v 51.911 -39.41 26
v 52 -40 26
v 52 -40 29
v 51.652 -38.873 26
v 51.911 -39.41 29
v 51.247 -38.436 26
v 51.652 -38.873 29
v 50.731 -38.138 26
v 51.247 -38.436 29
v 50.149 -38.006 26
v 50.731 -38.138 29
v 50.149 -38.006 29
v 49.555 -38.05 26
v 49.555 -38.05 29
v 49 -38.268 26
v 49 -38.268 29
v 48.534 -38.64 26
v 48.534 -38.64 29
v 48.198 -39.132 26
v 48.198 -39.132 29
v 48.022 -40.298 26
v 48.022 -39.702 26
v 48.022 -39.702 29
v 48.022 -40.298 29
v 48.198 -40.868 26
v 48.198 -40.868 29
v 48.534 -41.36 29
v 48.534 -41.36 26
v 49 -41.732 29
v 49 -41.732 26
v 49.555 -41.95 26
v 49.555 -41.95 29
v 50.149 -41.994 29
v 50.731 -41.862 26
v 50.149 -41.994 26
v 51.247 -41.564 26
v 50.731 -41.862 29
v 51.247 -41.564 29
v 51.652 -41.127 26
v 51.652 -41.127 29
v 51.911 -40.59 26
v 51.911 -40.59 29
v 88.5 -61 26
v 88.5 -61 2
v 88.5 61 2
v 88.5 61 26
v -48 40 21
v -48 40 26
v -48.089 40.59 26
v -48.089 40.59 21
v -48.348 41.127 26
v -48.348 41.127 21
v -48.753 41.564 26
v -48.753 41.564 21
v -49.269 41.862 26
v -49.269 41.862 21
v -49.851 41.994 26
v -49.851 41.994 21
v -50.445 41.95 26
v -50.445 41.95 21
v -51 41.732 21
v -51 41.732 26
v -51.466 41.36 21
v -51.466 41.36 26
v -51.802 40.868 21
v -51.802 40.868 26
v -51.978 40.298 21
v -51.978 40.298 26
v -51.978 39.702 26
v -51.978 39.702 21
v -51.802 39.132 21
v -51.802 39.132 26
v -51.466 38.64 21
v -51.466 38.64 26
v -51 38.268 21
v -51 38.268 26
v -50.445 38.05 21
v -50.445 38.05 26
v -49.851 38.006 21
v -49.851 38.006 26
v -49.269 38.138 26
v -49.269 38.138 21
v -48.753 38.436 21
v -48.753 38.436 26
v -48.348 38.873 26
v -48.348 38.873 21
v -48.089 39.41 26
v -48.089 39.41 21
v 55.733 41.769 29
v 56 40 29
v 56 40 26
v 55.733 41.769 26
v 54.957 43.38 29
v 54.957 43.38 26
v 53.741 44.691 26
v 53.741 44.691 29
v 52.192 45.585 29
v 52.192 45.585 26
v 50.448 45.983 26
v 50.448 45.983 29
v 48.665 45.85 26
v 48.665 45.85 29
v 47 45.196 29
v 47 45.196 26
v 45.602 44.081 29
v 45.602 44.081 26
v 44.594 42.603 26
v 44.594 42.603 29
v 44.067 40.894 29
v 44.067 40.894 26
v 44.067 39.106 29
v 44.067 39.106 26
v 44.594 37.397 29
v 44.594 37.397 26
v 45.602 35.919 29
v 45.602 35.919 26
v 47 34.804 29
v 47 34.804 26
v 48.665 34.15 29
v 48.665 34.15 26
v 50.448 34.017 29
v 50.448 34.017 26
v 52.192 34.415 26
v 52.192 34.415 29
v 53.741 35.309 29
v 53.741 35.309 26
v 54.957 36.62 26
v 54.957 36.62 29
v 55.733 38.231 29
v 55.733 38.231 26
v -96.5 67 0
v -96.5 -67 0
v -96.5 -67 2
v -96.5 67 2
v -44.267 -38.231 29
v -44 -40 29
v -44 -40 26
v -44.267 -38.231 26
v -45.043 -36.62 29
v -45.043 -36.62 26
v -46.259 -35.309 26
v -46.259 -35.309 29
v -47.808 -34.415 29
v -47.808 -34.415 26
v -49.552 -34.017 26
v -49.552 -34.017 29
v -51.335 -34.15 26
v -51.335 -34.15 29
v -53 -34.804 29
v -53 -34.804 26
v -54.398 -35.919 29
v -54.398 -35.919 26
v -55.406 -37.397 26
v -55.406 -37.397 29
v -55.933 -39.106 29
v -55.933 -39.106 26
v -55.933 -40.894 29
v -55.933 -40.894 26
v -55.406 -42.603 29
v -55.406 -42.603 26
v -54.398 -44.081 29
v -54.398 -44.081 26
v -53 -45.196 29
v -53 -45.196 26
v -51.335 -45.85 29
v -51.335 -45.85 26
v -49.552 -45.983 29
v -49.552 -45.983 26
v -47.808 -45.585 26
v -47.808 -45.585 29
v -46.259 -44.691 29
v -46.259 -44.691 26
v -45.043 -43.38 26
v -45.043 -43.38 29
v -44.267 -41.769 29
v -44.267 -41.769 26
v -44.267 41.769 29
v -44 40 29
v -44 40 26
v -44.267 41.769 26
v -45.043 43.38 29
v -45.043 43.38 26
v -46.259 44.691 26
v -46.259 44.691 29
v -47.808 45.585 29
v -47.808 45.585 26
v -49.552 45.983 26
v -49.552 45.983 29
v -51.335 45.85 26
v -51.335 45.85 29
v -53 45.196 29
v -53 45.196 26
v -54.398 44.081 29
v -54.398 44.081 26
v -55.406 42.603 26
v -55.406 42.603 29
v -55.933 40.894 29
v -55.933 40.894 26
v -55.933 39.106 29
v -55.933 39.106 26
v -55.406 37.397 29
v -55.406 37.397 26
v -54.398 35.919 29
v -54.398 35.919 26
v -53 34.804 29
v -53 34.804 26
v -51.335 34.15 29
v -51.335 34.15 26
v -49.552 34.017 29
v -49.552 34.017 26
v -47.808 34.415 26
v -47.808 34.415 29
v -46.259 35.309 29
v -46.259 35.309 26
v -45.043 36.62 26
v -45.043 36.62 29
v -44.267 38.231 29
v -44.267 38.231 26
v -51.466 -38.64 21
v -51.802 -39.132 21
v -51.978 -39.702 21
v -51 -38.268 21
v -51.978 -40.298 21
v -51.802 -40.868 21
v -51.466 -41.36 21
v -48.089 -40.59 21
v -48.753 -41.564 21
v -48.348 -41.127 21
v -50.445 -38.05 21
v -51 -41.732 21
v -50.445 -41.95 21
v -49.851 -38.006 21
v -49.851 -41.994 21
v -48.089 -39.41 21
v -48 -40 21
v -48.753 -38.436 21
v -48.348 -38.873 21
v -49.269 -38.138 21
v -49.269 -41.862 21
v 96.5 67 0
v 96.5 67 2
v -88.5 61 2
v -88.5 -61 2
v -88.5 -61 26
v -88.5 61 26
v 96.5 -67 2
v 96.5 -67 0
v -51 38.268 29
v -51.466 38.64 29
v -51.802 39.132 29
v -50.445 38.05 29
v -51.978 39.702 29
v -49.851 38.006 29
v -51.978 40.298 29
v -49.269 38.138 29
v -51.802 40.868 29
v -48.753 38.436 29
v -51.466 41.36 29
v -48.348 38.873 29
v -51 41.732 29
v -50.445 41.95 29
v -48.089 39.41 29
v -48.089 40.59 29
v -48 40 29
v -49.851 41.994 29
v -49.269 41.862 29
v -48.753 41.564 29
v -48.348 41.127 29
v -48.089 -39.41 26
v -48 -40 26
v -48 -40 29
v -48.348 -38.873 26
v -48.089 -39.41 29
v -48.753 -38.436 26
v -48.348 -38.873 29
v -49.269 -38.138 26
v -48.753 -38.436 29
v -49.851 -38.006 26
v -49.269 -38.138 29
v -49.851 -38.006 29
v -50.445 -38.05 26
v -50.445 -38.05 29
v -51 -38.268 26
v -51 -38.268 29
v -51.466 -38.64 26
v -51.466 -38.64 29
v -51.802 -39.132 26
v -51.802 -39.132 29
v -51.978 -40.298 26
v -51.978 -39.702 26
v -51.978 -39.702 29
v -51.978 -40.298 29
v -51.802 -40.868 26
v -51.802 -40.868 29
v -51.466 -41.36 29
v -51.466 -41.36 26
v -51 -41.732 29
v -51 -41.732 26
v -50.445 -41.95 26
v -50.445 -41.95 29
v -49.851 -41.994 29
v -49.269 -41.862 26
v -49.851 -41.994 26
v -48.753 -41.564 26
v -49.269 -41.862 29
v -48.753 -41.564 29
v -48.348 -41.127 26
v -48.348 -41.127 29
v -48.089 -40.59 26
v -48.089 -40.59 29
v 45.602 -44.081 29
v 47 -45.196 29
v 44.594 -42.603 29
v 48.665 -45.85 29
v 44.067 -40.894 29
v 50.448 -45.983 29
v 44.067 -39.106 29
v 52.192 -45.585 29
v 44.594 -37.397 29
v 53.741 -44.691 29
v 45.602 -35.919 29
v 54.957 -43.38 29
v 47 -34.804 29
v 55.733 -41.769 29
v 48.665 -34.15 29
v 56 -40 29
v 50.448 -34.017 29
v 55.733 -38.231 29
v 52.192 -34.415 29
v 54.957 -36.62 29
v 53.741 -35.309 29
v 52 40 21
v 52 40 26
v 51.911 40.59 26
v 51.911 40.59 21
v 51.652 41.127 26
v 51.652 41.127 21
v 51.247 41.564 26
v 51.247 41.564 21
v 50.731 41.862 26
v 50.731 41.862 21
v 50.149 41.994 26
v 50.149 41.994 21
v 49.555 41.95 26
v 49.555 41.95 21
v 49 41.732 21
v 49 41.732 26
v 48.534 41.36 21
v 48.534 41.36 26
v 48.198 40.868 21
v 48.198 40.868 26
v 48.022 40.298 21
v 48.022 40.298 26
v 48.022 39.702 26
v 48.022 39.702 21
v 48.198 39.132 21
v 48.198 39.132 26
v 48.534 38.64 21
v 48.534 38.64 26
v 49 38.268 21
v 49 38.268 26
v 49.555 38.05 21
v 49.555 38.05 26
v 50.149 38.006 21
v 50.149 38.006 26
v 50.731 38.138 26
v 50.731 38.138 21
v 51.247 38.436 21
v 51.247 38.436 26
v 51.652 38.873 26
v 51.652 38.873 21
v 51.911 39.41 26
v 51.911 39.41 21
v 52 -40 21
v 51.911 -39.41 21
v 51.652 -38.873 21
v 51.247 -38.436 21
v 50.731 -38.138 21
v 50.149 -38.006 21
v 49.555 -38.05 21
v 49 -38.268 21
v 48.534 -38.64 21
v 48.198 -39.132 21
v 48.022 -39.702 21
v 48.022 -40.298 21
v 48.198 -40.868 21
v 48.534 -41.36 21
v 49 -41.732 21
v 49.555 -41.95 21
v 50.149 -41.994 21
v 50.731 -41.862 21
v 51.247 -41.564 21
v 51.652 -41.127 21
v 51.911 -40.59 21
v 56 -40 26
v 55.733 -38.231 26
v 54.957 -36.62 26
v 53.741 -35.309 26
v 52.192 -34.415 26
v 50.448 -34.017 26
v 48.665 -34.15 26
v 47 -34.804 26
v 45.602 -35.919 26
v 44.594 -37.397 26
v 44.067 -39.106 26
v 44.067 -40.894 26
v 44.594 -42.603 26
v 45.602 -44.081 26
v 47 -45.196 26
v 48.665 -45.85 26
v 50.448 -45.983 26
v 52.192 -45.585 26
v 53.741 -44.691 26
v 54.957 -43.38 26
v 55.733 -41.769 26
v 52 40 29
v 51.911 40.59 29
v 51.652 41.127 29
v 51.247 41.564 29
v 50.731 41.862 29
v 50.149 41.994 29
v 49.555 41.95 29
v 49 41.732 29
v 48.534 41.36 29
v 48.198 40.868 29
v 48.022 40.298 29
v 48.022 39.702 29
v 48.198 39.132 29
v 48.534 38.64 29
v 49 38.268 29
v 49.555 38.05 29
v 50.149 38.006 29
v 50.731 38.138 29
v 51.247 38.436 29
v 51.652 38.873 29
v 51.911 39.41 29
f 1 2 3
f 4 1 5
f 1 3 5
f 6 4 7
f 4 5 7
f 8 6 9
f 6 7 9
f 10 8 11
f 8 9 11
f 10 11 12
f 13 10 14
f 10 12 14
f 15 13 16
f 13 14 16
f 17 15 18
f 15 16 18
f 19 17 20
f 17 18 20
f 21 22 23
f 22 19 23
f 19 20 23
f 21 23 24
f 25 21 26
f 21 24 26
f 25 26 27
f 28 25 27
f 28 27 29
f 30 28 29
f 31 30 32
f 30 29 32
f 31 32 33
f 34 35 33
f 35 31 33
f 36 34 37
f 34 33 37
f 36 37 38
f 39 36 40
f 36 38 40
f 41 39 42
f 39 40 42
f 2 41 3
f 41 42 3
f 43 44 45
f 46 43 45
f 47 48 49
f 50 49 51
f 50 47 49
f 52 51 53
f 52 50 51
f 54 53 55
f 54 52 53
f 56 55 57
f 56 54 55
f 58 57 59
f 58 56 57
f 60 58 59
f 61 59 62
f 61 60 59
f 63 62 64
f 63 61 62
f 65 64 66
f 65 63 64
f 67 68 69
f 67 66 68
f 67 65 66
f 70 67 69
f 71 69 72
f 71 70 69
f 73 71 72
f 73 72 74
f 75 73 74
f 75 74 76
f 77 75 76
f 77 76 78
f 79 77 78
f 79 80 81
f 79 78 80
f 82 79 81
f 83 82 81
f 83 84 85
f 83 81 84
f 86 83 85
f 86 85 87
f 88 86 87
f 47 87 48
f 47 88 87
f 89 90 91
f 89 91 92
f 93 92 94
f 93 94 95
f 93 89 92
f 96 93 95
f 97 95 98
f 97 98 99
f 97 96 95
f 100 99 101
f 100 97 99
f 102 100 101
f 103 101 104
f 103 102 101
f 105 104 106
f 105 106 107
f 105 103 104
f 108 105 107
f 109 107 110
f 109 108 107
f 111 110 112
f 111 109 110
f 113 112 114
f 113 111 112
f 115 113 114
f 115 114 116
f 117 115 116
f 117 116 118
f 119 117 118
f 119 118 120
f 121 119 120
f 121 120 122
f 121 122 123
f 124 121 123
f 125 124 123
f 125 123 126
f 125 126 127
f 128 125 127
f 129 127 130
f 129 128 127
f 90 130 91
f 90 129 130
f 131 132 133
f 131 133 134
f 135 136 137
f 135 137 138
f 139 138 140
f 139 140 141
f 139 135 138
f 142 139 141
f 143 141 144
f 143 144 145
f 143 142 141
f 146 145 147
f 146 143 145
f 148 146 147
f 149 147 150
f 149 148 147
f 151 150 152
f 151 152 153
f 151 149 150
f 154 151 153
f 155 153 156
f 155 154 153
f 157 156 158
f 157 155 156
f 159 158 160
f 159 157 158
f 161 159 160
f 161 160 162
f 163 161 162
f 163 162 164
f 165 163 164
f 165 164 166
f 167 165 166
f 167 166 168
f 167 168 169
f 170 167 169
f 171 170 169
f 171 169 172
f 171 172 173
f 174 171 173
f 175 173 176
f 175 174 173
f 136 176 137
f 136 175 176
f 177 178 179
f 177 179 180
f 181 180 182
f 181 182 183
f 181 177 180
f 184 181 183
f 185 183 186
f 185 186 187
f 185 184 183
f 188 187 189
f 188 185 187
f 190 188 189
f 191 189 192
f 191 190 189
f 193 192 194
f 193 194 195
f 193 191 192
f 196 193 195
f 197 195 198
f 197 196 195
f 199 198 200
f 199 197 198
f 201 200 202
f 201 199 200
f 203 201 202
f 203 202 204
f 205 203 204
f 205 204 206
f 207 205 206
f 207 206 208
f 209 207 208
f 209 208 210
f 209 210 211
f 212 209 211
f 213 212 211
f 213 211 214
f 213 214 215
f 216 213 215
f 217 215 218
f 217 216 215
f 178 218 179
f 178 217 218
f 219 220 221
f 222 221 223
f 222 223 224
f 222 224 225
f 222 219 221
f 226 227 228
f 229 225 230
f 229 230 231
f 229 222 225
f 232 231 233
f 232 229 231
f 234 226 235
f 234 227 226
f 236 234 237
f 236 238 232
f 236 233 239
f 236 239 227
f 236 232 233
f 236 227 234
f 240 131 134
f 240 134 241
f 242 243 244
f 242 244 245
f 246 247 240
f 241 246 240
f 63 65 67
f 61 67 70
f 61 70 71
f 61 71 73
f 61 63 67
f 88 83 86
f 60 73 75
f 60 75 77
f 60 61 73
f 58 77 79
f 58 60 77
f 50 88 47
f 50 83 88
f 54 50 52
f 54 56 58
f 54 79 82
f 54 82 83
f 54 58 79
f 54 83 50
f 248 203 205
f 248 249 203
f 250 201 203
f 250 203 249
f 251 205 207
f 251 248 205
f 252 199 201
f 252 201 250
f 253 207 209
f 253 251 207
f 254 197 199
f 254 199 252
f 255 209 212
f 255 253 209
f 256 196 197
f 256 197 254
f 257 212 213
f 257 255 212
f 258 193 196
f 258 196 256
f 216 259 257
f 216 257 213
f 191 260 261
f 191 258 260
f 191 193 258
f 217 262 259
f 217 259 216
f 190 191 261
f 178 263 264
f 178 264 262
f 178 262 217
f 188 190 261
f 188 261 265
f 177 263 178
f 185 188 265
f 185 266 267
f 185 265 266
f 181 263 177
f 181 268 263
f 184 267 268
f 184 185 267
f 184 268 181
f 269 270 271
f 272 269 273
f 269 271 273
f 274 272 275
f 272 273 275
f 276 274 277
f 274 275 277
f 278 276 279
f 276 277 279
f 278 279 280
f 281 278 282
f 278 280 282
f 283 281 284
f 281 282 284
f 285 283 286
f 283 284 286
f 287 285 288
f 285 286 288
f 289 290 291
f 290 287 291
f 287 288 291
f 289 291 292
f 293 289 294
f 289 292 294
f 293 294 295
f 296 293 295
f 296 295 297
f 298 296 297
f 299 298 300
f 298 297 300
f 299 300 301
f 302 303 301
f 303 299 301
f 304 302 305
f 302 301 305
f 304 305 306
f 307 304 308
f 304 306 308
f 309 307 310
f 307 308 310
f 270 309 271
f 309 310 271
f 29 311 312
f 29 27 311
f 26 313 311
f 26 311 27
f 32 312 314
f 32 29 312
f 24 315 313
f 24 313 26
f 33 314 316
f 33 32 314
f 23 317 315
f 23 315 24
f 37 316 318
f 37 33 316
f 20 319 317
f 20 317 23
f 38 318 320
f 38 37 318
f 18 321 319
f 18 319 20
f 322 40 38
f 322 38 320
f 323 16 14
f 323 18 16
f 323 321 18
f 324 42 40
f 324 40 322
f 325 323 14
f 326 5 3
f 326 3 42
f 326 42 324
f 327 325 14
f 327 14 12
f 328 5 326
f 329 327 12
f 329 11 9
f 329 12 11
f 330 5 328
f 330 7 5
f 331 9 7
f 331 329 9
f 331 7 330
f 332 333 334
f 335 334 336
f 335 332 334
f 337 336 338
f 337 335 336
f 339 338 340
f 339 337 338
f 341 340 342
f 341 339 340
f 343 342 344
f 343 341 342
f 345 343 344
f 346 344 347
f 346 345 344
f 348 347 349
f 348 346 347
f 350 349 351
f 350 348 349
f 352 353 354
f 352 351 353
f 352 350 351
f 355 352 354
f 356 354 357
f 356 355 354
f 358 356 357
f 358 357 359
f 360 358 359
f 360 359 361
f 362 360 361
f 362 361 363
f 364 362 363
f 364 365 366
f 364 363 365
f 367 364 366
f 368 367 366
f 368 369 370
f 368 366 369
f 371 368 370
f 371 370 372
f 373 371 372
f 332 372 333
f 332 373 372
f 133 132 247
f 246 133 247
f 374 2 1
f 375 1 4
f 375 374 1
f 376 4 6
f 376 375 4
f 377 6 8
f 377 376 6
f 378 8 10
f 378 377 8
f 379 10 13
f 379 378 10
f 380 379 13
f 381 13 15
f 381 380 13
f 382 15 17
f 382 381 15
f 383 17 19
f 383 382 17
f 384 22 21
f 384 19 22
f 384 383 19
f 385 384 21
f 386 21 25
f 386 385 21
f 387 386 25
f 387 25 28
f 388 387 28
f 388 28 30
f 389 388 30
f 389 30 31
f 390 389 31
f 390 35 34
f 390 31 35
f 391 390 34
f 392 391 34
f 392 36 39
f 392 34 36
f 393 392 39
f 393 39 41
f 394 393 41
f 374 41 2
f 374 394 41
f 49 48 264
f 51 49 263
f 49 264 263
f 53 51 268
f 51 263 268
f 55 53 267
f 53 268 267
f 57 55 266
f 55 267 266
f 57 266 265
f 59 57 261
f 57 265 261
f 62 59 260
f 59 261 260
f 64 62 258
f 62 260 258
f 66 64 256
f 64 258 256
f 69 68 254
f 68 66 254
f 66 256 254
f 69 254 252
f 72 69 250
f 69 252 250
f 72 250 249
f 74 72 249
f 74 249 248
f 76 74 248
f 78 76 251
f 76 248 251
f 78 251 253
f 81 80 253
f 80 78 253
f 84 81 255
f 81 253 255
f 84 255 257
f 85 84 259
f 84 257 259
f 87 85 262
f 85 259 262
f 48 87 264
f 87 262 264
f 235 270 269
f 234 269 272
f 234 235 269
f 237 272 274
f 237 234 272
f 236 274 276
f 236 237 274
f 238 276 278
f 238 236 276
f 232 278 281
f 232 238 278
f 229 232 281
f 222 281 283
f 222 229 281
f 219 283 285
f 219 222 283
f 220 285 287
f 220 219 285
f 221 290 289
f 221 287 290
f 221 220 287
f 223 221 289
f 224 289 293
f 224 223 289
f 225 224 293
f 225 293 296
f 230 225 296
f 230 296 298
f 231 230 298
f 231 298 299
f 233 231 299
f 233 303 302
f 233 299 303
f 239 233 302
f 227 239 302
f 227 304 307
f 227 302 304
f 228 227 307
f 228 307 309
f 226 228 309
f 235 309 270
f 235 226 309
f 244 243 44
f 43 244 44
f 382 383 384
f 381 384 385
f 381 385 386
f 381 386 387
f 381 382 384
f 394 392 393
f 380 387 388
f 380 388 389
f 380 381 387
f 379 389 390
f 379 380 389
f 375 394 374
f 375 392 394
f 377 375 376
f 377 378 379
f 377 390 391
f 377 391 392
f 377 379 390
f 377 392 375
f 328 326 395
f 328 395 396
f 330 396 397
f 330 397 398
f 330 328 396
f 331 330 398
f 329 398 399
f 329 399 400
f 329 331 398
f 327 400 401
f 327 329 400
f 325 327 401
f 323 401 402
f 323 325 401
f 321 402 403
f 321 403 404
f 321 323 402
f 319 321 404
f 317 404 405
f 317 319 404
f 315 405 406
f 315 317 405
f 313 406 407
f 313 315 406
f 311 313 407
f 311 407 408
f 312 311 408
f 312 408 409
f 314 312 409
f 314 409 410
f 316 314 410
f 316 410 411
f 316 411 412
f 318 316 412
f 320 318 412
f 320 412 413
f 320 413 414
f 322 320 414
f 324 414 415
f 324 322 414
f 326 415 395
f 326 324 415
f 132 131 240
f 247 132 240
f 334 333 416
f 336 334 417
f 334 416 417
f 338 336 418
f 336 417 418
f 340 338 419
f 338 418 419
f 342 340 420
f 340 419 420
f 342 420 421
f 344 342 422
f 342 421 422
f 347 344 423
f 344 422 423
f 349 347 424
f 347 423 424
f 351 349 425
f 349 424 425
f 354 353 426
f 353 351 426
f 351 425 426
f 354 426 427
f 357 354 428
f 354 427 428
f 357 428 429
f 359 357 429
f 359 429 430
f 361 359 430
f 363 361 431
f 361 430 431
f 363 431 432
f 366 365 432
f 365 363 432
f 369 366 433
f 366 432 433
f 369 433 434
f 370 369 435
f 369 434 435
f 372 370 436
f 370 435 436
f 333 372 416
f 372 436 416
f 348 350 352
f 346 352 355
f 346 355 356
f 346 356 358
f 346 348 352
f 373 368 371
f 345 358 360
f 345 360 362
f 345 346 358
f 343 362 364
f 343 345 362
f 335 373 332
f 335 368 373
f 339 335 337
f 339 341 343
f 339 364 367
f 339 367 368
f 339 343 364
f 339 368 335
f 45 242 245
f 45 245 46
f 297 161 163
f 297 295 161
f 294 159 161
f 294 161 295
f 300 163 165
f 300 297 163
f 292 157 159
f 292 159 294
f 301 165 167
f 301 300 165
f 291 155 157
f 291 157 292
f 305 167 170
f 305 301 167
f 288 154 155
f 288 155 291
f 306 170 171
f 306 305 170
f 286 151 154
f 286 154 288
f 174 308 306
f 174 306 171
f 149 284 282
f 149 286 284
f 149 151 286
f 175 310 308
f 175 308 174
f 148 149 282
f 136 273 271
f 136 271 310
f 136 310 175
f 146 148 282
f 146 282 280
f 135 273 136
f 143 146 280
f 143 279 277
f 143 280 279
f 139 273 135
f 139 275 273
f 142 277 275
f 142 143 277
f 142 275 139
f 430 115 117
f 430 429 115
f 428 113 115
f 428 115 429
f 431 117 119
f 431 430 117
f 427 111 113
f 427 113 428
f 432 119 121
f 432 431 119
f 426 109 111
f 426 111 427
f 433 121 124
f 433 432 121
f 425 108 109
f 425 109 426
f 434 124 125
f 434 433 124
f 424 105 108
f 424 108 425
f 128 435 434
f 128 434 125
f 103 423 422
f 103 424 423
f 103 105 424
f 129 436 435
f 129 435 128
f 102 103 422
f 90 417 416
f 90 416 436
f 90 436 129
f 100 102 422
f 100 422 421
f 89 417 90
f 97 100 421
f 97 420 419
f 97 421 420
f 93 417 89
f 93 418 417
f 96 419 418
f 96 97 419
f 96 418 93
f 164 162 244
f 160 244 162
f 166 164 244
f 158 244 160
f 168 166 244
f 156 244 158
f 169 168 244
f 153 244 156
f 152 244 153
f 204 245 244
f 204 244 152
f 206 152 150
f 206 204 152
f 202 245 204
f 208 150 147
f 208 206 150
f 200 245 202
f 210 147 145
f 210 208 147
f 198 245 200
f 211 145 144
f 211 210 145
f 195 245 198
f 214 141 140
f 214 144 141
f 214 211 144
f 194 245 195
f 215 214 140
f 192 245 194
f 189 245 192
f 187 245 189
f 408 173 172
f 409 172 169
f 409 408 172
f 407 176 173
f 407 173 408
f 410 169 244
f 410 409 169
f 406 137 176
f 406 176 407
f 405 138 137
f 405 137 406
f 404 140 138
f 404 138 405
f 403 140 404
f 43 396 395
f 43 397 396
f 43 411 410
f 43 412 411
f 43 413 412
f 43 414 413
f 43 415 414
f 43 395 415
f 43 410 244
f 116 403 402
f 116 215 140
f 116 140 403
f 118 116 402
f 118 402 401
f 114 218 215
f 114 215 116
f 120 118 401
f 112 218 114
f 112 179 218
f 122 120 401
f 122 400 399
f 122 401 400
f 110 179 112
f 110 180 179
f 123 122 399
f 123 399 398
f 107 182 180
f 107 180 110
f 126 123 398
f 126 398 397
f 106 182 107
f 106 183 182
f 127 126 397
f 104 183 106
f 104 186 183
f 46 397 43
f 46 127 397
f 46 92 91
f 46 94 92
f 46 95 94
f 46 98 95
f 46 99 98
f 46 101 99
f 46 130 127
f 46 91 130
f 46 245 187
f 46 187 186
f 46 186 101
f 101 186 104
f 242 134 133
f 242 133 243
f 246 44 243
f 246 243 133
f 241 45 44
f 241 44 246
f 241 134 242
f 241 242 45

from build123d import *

# Parameters (mm, degrees)
SKETCH_1_W               = 193
SKETCH_1_H               = 134
EXTRUDE_1_DEPTH          = 2
SKETCH_2_W               = 177
SKETCH_2_H               = 122
EXTRUDE_2_DEPTH          = 24
CUT_EXTRUDE_1_DEPTH      = 10
CUT_EXTRUDE_1_DEPTH_BACK = 5
SKETCH_3_R               = 2
EXTRUDE_START            = 3
SKETCH_4_R               = 6
SKETCH_4_R_2             = 2
EXTRUDE_3_DEPTH          = 3


with BuildPart() as part:
    # 草图1 → 凸台-拉伸1 (new body)
    with BuildSketch(Plane.XY):
        Rectangle(SKETCH_1_W, SKETCH_1_H)
    extrude(amount=EXTRUDE_1_DEPTH)

    # 草图2 → 凸台-拉伸2 (add)
    with BuildSketch(Plane.XY.offset(2)):
        Rectangle(SKETCH_2_W, SKETCH_2_H)
    extrude(amount=EXTRUDE_2_DEPTH)

    # 草图3 → 切除-拉伸1 (cut, two sides: drawn at the far end of the back side and taken through both)
    with BuildSketch(Plane.XY.offset(26).offset(-CUT_EXTRUDE_1_DEPTH_BACK)):
        with Locations((-50, 40)):
            Circle(SKETCH_3_R)
        with Locations((-50, -40)):
            Circle(SKETCH_3_R)
        with Locations((50, -40)):
            Circle(SKETCH_3_R)
        with Locations((50, 40)):
            Circle(SKETCH_3_R)
    extrude(amount=CUT_EXTRUDE_1_DEPTH + CUT_EXTRUDE_1_DEPTH_BACK, mode=Mode.SUBTRACT)

    # 草图4 → 凸台-拉伸3 (add)
    # profile 1 of 4: a face of its own
    with BuildSketch(Plane.XY.offset(26).offset(EXTRUDE_START)):
        with Locations((-50, 40)):
            Circle(SKETCH_4_R)
        with Locations((-50, 40)):
            Circle(SKETCH_4_R_2, mode=Mode.SUBTRACT)
    # profile 2 of 4: a face of its own
    with BuildSketch(Plane.XY.offset(26).offset(EXTRUDE_START)):
        with Locations((-50, -40)):
            Circle(SKETCH_4_R)
        with Locations((-50, -40)):
            Circle(SKETCH_4_R_2, mode=Mode.SUBTRACT)
    # profile 3 of 4: a face of its own
    with BuildSketch(Plane.XY.offset(26).offset(EXTRUDE_START)):
        with Locations((50, -40)):
            Circle(SKETCH_4_R)
        with Locations((50, -40)):
            Circle(SKETCH_4_R_2, mode=Mode.SUBTRACT)
    # profile 4 of 4: a face of its own
    with BuildSketch(Plane.XY.offset(26).offset(EXTRUDE_START)):
        with Locations((50, 40)):
            Circle(SKETCH_4_R)
        with Locations((50, 40)):
            Circle(SKETCH_4_R_2, mode=Mode.SUBTRACT)
    extrude(amount=-EXTRUDE_3_DEPTH)


solid = part.part
